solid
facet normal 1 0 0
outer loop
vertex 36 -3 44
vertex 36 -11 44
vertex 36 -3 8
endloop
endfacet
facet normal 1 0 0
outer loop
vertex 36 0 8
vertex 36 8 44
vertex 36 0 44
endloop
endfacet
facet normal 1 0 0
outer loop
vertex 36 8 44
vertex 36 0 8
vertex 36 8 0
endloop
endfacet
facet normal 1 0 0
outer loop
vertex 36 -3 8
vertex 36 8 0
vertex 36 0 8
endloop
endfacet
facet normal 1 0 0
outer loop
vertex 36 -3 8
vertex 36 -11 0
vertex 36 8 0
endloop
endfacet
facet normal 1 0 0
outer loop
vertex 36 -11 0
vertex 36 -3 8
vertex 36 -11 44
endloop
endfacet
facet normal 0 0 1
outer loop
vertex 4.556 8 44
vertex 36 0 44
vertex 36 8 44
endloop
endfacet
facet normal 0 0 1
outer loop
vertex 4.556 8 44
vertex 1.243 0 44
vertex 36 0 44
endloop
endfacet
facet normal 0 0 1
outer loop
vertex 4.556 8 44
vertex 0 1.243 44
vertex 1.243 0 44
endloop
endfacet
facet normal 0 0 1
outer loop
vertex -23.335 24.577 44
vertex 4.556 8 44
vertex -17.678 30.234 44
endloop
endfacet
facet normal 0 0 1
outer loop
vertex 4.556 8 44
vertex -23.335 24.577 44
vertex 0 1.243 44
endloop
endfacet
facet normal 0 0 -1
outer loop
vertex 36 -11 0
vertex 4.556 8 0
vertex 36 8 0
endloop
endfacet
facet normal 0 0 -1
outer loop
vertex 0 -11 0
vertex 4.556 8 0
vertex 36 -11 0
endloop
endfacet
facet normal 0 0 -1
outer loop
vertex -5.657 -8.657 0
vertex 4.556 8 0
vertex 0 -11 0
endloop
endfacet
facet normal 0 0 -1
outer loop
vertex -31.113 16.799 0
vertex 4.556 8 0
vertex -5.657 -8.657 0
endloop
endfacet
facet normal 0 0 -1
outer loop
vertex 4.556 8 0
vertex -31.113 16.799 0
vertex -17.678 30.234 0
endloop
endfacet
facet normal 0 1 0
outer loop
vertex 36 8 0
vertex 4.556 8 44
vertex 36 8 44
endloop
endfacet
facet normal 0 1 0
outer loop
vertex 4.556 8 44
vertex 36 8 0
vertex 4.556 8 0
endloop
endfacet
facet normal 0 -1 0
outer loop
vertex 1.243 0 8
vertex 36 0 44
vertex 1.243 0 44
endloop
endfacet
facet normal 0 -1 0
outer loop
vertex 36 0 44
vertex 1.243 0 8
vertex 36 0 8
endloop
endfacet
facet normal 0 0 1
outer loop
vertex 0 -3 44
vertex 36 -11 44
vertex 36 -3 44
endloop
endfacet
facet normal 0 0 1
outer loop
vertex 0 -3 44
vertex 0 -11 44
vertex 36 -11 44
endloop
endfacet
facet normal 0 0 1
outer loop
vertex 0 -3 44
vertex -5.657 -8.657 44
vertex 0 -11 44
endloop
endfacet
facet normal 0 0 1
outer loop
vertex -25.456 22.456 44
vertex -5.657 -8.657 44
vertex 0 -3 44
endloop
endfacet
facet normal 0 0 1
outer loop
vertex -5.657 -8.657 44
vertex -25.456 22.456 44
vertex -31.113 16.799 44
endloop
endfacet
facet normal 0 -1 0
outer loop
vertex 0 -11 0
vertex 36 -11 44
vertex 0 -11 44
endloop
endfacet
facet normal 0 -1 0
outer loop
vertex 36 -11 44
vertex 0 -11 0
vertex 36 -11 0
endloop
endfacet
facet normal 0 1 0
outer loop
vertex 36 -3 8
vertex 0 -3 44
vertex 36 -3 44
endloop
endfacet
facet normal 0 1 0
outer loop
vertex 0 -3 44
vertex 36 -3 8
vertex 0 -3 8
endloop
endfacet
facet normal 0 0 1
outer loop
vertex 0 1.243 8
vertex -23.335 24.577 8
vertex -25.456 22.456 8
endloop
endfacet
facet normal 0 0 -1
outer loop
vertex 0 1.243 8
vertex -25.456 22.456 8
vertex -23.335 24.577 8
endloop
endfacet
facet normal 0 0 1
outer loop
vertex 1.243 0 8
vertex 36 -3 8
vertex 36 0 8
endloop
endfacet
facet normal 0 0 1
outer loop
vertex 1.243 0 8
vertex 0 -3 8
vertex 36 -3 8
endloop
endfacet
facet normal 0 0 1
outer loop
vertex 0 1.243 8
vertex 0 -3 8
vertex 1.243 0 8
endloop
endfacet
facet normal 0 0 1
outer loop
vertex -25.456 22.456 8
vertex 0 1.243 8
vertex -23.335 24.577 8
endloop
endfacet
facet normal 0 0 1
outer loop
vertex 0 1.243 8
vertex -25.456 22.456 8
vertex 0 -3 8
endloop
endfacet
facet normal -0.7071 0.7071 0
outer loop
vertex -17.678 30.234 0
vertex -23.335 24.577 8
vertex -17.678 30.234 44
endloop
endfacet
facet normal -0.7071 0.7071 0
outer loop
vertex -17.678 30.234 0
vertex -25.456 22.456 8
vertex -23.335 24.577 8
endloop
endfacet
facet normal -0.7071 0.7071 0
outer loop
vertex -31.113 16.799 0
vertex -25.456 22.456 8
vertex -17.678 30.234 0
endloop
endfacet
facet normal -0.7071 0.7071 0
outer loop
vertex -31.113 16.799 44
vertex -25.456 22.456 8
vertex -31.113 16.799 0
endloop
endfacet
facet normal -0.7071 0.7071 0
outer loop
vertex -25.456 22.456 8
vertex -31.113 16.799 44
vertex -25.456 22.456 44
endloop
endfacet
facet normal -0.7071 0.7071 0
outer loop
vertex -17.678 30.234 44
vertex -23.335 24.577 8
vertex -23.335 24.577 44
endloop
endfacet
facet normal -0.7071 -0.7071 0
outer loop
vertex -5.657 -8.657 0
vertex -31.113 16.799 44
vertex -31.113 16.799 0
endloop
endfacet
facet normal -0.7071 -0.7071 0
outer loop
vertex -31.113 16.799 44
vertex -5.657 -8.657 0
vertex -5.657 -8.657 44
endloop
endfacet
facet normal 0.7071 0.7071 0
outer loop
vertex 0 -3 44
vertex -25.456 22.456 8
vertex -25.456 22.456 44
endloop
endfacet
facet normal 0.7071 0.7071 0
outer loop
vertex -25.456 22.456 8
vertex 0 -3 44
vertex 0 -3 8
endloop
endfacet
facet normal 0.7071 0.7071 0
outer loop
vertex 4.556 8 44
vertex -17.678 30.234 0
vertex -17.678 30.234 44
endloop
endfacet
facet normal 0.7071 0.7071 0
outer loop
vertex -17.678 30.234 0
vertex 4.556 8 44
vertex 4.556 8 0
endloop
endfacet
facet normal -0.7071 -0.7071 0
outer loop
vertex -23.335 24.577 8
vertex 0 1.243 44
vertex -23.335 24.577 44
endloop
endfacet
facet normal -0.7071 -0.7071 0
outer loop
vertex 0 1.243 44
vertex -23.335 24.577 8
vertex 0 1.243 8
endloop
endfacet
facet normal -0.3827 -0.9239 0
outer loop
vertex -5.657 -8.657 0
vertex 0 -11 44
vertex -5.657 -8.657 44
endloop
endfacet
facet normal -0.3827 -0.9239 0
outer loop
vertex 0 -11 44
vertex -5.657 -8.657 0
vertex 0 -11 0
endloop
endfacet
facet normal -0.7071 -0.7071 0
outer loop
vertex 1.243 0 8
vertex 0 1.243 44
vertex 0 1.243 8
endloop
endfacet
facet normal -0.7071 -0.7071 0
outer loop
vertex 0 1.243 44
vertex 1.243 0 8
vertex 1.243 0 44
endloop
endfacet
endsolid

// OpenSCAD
$t = 3; //Mimi hat 4mm Plexiglasdicke geschickt
$h = 36;
$th = 8;//$t*2; //8
$ht = $h + $th; //height and width = 50 + 4 (t)

module winkel()
{
//cube([$h,$ht,$th]);
cube([$h,$th,$ht]);
}

module stabilizer()
{
translate([$th,0,0])
rotate([0,-90,0])
linear_extrude(height=$th)
polygon([[$th,$ht],[$ht,$th],[0,0]]);
}

module complete(s1=true,s2=true)
{
  winkel();
  if (s1)
    stabilizer();
  if (s2)
  {
    translate([$h-$th,0,0])
    stabilizer();
  }
}

module edgeholder(s1=true,s2=true,s3=true,s4=true)
{
  complete(s1,s2);
  translate([$h,-$t,0])
  rotate([0,0,180])
  complete(s3,s4);

  translate([0,-$t,0])
  cube([$h,2+$t,$th]);
}

$breite=800;//80*92cm
$hoehe=920/2;

module window()
{
color("white")
translate([0,-$t,$th])
cube([$breite,$t,$hoehe]);
}

module middleholder()
{
translate([$breite-$h+$th/2,0,0])
edgeholder(false,false,false,false);
translate([$breite-$th/2,0,0])
edgeholder(false,false,false,false);
}

module windows()
{
window();
color("silver")
translate([$breite,0,0])
window();
}

//windows();

module total()
{
  translate([0,-$t,0])
  rotate([0,0,135])
  edgeholder(false,false,false,false);

  edgeholder(false,false,false,false);

  color("red")
  linear_extrude(height=$h+$th)
  polygon([[0,-$t],[0,-11],[-5.657,-8.657]]);
}

module glascut()
{
  translate([0,-$t,$th])
  color("blue")
  cube([$h,$t,$h]);

  translate([0,-$t,$th])
  color("blue")
  rotate([0,0,135])
  translate([0,-$t,0])
  cube([$h,$t,$h]);
}

difference()
{
  total();
  glascut();
}

//middleholder();

//translate([$breite*2-$ht,0,0])
//edgeholder();
